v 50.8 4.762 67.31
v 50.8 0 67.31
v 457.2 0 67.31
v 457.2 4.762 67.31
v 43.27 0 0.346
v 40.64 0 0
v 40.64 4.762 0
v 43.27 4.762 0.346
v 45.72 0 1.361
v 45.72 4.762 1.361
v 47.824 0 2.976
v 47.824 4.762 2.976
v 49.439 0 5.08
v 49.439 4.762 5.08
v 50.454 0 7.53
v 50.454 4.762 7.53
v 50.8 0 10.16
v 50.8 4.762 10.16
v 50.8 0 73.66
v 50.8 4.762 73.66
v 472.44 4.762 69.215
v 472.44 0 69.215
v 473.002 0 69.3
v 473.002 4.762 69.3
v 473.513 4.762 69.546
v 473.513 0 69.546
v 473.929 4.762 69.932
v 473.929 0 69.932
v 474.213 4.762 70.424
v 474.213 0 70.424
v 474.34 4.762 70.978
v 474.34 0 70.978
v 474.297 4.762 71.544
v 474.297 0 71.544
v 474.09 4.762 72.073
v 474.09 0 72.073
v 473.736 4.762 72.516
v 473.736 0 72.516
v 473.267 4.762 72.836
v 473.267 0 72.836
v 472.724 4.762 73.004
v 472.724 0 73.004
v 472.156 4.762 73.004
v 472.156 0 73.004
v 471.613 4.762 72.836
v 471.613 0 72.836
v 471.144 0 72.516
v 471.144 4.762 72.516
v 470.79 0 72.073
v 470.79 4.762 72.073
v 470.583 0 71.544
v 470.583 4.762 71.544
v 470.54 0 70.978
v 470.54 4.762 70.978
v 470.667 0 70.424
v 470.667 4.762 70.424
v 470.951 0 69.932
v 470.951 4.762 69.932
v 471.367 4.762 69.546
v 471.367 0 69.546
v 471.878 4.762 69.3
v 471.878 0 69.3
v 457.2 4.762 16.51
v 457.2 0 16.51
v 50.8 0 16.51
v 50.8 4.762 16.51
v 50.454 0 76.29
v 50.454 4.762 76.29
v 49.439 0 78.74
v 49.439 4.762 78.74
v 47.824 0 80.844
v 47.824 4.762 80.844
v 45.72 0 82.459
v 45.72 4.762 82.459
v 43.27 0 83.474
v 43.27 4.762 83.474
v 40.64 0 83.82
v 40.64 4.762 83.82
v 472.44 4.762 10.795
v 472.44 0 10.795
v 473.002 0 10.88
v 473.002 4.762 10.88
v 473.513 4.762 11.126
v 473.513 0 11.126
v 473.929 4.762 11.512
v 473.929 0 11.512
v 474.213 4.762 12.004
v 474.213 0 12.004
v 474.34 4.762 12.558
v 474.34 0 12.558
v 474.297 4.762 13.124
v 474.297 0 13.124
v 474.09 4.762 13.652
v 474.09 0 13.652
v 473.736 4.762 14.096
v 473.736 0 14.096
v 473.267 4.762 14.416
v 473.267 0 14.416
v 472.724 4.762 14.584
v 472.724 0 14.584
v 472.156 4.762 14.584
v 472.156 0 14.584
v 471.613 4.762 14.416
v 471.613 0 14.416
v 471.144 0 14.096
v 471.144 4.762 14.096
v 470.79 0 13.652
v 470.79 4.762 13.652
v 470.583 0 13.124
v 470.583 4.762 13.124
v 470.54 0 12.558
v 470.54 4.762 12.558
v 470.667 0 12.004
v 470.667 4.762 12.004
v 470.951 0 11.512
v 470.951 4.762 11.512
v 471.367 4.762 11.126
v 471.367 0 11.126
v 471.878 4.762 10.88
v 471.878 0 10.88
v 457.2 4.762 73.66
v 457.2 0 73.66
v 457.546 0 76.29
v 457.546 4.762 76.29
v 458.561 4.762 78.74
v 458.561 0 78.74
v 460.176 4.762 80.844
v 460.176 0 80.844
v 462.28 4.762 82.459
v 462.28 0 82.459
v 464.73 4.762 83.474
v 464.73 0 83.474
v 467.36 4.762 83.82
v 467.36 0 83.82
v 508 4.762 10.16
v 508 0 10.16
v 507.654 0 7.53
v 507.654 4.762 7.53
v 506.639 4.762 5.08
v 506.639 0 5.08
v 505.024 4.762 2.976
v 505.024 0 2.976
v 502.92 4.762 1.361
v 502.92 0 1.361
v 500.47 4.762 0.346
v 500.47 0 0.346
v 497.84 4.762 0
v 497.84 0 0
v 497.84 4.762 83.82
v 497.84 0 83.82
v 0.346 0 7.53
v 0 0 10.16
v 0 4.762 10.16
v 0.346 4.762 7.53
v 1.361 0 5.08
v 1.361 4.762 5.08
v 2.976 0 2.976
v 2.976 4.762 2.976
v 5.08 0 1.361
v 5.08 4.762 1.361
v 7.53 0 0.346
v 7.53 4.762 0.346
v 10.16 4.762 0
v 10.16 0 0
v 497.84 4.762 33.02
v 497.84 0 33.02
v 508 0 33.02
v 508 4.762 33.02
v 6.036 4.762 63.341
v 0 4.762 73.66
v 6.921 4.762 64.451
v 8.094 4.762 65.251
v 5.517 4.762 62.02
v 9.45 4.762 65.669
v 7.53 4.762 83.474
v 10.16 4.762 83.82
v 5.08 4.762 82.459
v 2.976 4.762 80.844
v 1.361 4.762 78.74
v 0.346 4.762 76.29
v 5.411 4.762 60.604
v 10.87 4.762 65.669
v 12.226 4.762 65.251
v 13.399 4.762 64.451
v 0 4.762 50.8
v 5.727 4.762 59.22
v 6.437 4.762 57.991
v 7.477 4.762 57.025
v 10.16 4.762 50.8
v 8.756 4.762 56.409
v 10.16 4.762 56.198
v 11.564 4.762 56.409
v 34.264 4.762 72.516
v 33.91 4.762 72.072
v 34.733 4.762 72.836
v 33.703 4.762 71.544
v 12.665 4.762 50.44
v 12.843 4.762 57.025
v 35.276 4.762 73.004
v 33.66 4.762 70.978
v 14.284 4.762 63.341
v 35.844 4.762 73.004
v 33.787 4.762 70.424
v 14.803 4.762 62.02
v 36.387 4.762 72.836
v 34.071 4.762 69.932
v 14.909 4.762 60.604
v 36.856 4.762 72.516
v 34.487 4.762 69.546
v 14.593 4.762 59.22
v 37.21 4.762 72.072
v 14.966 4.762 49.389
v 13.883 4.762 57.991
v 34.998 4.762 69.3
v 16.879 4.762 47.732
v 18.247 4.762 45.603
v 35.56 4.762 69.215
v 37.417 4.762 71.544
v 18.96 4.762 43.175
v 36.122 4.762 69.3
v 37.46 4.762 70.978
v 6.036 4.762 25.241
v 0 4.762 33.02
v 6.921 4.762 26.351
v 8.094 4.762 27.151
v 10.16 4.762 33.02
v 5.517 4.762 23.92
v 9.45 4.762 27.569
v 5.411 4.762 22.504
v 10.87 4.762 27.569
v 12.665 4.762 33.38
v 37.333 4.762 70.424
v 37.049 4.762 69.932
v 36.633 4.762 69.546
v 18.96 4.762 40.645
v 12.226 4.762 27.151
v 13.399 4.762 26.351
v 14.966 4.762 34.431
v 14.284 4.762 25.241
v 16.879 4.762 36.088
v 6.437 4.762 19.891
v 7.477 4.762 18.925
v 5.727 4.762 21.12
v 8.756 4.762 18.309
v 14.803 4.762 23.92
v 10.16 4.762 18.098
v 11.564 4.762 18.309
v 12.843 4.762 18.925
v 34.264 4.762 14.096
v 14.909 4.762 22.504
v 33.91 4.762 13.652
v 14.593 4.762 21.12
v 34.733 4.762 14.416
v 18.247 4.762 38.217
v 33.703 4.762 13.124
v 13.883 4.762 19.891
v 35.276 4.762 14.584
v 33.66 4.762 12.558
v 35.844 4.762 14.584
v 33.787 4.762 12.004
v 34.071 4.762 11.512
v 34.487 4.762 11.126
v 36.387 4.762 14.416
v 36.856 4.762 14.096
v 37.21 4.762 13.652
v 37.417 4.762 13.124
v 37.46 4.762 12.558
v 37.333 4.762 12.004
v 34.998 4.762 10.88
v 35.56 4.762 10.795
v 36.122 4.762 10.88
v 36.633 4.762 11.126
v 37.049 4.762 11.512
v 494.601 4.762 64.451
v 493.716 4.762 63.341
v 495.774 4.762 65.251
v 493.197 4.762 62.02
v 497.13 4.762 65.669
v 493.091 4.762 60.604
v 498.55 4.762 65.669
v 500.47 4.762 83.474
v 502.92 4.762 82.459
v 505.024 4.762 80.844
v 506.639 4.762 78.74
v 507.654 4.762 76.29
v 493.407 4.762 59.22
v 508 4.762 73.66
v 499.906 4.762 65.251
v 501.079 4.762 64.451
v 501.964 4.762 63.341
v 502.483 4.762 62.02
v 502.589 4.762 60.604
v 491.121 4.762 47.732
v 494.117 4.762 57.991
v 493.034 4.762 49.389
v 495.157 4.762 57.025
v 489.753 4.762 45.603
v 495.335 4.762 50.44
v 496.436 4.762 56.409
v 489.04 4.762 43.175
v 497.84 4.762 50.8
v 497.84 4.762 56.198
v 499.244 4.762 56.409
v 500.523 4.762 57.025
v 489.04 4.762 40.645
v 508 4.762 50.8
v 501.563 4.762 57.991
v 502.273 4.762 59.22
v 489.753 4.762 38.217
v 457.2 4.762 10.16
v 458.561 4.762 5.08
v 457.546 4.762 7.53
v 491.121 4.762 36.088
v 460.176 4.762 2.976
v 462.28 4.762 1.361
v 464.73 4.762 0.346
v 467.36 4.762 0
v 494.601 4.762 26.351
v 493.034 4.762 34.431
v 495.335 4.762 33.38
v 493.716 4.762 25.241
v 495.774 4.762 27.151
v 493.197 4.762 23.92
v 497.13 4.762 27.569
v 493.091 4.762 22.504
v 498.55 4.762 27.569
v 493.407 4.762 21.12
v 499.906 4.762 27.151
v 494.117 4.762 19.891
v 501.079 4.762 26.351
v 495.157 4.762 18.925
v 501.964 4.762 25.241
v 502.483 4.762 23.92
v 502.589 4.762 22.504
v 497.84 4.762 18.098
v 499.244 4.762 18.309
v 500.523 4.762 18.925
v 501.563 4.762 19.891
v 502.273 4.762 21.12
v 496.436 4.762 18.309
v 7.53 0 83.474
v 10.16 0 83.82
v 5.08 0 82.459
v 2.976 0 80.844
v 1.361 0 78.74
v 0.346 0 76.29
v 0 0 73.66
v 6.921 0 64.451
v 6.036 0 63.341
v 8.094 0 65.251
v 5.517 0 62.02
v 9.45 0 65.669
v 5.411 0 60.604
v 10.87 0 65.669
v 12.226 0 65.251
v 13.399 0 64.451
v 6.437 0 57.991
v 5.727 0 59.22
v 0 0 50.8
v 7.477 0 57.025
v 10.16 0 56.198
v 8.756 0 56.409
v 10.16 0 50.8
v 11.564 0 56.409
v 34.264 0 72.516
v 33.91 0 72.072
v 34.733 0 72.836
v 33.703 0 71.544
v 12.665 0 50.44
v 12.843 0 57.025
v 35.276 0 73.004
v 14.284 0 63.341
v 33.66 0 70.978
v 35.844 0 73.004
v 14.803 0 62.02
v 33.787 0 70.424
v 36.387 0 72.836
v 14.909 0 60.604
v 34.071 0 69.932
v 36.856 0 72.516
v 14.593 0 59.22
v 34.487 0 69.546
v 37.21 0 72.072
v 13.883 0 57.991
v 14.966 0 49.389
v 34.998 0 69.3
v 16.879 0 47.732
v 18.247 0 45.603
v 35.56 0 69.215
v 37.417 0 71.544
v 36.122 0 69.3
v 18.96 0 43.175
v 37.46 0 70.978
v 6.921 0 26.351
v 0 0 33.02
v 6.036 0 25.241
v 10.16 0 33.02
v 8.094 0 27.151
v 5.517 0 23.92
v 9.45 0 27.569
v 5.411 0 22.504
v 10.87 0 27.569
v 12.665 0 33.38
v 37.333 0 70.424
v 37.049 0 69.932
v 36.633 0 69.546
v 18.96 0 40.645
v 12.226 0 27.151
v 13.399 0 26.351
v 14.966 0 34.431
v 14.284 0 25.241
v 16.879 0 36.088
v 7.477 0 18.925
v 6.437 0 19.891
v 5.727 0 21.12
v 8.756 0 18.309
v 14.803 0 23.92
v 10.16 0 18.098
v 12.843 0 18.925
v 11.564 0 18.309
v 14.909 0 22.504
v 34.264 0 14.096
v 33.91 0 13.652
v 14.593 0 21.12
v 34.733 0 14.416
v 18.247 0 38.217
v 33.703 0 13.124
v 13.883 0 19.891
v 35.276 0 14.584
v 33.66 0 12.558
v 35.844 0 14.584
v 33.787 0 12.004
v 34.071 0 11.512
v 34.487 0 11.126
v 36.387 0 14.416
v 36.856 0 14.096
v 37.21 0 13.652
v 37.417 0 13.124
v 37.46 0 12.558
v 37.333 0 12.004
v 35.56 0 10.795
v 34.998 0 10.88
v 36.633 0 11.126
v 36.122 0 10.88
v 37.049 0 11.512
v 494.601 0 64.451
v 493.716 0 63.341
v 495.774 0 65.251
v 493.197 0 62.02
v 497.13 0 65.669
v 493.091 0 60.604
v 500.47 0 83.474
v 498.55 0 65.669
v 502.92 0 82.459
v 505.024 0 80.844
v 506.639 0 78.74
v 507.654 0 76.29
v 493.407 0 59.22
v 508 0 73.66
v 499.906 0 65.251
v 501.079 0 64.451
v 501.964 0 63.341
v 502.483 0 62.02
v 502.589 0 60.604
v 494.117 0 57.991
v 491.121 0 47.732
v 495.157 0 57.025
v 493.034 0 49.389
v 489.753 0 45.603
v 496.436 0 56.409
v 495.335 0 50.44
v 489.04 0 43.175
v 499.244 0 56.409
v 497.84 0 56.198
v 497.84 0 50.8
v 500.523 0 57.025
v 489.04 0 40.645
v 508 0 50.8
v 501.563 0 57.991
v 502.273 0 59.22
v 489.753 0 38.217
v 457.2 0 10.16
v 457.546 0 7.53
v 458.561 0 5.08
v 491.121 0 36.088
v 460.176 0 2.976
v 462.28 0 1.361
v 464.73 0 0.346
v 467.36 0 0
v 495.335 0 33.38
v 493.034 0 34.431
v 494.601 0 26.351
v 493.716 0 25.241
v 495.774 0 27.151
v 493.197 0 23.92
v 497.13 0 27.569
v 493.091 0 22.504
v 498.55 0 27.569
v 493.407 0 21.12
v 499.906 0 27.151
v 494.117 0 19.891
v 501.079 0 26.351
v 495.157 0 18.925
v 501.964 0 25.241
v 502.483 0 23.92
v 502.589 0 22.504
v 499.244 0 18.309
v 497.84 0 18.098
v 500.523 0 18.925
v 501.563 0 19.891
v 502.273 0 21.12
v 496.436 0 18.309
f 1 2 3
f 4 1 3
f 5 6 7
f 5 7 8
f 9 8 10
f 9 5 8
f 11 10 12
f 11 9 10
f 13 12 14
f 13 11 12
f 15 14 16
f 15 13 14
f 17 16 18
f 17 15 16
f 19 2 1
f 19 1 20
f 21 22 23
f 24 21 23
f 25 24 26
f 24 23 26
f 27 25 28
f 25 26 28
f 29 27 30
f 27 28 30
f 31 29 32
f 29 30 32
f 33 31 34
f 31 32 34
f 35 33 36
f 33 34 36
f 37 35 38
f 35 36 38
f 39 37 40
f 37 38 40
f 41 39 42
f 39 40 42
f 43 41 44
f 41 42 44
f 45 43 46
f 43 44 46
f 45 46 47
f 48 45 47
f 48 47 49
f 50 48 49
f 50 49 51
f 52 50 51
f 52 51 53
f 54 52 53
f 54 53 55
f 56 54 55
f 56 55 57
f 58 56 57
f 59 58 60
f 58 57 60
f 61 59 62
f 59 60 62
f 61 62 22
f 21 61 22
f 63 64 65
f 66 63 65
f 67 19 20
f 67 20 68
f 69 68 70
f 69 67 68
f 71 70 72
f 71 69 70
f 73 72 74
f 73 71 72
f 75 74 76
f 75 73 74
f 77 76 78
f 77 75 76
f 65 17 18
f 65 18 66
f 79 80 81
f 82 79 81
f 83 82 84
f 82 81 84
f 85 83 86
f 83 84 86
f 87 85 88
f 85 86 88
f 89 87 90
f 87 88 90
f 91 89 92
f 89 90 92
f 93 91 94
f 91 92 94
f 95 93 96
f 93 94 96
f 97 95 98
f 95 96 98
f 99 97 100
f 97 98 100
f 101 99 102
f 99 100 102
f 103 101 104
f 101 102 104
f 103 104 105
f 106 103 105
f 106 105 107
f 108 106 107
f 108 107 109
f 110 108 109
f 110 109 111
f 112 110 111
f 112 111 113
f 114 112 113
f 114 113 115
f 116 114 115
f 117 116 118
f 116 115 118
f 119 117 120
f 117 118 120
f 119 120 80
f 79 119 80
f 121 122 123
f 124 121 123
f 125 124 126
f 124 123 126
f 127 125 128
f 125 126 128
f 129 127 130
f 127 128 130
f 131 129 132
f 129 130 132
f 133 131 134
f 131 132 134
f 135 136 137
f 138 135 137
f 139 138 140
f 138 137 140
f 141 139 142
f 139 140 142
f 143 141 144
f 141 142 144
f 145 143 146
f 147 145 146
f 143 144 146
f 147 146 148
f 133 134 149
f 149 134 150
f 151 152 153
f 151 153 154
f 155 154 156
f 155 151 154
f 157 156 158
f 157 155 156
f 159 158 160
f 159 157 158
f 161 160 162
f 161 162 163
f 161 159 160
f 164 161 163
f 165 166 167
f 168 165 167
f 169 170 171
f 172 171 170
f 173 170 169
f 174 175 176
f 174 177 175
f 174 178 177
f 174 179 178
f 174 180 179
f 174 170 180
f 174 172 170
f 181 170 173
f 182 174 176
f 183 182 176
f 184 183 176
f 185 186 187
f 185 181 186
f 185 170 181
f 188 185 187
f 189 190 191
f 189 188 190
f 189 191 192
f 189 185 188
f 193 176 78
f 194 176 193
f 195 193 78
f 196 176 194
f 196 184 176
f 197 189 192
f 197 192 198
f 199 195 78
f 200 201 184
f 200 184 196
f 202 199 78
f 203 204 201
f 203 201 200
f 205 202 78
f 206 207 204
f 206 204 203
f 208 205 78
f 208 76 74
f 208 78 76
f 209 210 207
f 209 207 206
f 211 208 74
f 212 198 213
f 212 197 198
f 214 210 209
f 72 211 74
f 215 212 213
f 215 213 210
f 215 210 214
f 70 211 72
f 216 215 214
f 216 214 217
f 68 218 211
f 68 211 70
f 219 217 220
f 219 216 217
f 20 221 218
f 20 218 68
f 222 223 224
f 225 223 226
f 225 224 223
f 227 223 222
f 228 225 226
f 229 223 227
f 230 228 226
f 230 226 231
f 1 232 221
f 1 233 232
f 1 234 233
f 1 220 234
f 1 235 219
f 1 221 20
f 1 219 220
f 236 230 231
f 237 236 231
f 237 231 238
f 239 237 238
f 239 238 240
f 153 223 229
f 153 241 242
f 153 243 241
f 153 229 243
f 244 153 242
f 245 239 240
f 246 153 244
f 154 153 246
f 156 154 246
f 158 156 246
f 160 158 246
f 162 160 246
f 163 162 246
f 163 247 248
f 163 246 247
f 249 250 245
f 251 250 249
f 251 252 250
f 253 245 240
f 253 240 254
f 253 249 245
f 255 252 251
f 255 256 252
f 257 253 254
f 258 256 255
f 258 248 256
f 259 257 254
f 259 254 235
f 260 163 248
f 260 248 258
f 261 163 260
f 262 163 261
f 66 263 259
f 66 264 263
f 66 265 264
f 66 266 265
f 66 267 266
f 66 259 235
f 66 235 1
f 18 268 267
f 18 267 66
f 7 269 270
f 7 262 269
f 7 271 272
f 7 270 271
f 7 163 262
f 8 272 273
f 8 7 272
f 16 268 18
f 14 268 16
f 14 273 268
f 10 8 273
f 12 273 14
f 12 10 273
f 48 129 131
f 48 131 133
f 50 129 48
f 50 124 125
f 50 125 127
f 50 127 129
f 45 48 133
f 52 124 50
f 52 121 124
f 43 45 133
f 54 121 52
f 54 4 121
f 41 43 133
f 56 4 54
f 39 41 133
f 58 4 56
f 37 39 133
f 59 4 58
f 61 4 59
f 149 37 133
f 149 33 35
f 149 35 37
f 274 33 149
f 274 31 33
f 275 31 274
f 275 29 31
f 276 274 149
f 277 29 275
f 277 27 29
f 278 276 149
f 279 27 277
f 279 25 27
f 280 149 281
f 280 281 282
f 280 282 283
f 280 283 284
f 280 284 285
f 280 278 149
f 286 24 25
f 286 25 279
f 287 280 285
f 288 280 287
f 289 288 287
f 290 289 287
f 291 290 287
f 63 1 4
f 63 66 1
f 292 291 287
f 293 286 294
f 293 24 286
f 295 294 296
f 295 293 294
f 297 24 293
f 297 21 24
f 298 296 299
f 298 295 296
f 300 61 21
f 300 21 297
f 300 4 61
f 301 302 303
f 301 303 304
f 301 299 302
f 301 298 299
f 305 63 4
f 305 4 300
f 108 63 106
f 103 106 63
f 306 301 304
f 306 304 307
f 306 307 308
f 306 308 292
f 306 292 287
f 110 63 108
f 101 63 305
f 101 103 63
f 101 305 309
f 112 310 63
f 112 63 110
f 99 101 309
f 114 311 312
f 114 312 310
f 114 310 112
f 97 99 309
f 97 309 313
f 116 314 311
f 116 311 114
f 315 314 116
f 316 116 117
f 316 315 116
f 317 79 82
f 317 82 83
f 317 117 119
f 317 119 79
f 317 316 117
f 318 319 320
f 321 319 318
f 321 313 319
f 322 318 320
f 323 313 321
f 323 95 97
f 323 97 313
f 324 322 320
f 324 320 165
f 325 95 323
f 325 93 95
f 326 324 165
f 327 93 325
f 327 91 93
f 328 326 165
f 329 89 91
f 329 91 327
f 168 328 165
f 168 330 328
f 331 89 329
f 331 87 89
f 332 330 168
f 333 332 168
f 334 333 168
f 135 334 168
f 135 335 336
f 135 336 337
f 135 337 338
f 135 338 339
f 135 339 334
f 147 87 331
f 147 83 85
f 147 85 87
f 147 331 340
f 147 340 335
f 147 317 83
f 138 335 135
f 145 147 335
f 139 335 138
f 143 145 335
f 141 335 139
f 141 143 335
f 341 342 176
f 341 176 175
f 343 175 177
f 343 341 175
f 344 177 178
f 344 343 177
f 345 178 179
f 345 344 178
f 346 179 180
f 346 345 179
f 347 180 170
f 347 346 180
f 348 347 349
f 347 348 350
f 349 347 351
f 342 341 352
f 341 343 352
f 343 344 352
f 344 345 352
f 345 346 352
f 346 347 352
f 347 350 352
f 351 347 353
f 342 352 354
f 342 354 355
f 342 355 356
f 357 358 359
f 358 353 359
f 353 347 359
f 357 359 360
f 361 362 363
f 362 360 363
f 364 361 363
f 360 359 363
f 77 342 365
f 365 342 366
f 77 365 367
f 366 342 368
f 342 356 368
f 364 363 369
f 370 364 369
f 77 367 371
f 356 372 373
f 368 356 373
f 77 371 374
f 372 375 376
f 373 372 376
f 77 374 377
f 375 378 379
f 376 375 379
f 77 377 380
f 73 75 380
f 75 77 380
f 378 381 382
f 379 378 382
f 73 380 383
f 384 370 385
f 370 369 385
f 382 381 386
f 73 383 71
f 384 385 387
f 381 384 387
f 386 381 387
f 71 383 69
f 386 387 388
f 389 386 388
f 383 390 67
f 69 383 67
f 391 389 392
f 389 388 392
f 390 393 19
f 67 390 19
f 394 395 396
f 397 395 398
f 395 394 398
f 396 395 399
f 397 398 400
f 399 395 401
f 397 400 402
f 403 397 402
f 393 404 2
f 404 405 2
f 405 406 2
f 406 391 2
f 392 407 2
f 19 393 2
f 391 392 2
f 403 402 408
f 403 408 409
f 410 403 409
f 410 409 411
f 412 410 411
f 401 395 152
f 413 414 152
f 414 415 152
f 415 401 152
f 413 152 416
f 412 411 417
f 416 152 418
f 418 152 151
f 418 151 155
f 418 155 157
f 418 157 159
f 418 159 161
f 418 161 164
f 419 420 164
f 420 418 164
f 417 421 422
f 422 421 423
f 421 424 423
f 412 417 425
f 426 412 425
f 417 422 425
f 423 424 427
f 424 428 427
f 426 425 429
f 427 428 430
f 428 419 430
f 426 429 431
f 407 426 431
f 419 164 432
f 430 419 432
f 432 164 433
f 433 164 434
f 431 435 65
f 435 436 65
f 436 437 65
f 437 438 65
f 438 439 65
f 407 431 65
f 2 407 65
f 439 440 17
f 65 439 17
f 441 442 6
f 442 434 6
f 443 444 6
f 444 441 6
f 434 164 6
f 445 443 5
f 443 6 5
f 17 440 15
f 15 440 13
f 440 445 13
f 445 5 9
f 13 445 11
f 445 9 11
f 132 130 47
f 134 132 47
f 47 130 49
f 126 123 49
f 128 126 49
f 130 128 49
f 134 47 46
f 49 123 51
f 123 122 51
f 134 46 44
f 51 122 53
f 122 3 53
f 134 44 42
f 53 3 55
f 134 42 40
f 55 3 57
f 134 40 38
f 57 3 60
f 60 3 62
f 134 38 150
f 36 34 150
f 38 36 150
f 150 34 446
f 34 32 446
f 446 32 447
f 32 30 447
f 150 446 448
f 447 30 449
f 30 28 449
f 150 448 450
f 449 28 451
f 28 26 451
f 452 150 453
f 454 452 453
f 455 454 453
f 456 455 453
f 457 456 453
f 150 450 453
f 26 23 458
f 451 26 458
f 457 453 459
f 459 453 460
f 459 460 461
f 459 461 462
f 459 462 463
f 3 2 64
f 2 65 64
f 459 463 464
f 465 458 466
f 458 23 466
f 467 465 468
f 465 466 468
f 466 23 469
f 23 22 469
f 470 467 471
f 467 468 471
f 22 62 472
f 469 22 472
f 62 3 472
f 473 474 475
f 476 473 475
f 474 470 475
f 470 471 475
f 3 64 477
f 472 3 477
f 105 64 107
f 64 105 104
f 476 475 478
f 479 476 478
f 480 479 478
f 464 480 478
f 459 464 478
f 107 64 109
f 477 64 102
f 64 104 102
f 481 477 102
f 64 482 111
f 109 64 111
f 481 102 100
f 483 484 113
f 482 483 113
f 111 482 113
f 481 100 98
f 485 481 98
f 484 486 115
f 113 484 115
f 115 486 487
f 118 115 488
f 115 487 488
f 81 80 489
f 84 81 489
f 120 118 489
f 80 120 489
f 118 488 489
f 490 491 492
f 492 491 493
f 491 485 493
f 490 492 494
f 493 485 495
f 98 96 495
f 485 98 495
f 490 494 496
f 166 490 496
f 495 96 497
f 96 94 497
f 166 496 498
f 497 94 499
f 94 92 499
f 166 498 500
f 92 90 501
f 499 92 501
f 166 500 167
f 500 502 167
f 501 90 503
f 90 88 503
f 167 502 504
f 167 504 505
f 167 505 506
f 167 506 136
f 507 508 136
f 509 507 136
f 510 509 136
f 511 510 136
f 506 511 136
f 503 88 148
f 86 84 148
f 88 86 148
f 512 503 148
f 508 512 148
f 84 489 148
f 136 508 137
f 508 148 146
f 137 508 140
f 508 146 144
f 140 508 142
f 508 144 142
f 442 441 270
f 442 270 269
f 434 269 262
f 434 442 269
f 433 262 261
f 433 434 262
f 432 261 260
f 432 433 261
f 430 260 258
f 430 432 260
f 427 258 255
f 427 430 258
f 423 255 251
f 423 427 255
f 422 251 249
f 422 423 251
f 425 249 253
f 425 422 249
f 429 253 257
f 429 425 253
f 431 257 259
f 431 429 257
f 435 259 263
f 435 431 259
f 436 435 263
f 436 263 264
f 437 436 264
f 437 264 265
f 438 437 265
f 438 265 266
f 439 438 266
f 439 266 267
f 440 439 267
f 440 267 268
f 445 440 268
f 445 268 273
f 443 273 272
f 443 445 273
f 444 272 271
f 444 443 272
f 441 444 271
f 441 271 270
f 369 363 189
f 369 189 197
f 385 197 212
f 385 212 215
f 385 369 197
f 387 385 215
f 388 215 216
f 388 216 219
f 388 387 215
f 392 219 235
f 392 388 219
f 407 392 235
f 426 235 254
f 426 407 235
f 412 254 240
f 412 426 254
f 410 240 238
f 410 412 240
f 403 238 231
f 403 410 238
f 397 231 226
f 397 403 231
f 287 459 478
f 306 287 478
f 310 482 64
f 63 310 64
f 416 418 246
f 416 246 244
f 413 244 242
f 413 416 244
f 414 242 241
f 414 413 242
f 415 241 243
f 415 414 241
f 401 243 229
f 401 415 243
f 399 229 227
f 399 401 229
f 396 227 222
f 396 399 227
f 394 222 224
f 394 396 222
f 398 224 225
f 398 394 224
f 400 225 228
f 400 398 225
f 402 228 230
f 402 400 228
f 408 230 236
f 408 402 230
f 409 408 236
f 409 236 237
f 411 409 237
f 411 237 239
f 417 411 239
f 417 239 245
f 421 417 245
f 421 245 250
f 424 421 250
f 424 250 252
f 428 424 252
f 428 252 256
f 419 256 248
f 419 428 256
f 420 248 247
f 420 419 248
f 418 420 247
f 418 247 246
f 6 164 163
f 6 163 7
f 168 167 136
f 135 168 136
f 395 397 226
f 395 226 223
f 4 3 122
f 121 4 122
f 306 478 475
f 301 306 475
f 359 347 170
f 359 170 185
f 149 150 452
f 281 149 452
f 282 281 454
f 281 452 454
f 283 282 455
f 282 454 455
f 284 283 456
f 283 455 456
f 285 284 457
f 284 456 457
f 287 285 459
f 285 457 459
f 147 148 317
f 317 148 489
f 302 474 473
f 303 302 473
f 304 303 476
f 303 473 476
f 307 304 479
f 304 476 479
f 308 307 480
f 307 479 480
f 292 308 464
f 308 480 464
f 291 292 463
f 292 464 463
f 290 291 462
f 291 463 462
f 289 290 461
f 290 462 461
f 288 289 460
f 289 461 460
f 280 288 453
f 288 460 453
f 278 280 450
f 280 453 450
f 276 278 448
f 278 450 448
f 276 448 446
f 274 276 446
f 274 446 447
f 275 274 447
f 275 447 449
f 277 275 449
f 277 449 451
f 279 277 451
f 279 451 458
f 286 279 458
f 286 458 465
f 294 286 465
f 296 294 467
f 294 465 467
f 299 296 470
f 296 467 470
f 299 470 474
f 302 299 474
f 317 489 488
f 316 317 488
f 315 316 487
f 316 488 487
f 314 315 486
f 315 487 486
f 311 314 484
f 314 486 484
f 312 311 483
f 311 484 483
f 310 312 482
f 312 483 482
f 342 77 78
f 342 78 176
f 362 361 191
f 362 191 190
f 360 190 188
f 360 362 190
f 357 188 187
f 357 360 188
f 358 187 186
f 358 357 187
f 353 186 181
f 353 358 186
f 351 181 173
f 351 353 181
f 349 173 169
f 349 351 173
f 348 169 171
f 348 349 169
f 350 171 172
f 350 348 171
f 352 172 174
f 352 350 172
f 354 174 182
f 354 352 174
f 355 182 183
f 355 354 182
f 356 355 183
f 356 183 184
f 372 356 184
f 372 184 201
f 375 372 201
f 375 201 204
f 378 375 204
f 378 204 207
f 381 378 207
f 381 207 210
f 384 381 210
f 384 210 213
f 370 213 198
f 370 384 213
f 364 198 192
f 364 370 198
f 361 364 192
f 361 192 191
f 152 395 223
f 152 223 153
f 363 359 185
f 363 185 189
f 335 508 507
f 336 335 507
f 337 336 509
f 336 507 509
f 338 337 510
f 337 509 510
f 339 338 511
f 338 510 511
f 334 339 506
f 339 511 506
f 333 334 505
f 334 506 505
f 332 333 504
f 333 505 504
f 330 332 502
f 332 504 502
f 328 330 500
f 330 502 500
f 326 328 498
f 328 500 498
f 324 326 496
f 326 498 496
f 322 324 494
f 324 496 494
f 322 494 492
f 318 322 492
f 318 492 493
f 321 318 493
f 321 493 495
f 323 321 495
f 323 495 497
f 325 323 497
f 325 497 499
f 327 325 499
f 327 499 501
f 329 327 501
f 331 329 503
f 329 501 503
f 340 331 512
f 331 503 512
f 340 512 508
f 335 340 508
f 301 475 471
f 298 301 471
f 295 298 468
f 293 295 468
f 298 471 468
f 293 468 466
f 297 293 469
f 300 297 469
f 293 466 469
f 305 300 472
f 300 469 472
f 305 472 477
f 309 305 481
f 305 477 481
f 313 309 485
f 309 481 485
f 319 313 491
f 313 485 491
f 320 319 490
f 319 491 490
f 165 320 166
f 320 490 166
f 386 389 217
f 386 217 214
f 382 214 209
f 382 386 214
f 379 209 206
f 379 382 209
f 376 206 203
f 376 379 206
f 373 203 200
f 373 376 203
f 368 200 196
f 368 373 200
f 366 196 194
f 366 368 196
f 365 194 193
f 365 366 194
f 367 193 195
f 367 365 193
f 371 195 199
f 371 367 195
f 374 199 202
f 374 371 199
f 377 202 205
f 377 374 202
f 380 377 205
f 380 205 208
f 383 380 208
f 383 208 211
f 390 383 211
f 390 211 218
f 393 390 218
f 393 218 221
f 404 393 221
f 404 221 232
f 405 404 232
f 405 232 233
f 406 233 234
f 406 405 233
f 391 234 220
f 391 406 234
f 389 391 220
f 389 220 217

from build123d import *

# Parameters (mm, degrees)
SKETCH1_R           = 4.7625
SKETCH1_R_2         = 1.905
BOSS_EXTRUDE1_DEPTH = 4.7625


with BuildPart() as part:
    # Sketch1 → Boss-Extrude1 (new body)
    with BuildSketch(Plane(origin=(0, 0, 0), x_dir=(1, 0, 0), z_dir=(0, 1, 0))):
        with BuildLine():
            Line((10.16, 0), (40.64, 0))
            ThreePointArc((40.64, 0), (47.824204897, -2.975795103), (50.8, -10.16))
            Line((50.8, -10.16), (50.8, -16.51))
            Line((50.8, -16.51), (254, -16.51))
            Line((254, -16.51), (254, -67.31))
            Line((254, -67.31), (50.8, -67.31))
            Line((50.8, -67.31), (50.8, -73.66))
            ThreePointArc((50.8, -73.66), (47.824204897, -80.844204897), (40.64, -83.82))
            Line((40.64, -83.82), (10.16, -83.82))
            ThreePointArc((10.16, -83.82), (2.975795103, -80.844204897), (0, -73.66))
            Line((0, -73.66), (0, -50.8))
            Line((0, -50.8), (10.16, -50.8))
            ThreePointArc((10.16, -50.8), (19.05, -41.91), (10.16, -33.02))
            Line((10.16, -33.02), (0, -33.02))
            Line((0, -33.02), (0, -10.16))
            ThreePointArc((0, -10.16), (2.975795103, -2.975795103), (10.16, 0))
        make_face()
        with Locations(Location((10.16, -60.96, 0), (0, 0, 90))):
            Circle(SKETCH1_R, mode=Mode.SUBTRACT)
        with Locations(Location((10.16, -22.86, 0), (0, 0, 90))):
            Circle(SKETCH1_R, mode=Mode.SUBTRACT)
        with Locations(Location((35.56, -71.12, 0), (0, 0, 90))):
            Circle(SKETCH1_R_2, mode=Mode.SUBTRACT)
        with Locations(Location((35.56, -12.7, 0), (0, 0, 90))):
            Circle(SKETCH1_R_2, mode=Mode.SUBTRACT)
    boss_extrude1 = extrude(amount=BOSS_EXTRUDE1_DEPTH)

    # Mirror1: Boss-Extrude1 across plane
    add(boss_extrude1.mirror(Plane(origin=(254, 4.7625, 67.31), x_dir=(0, 0, 1), z_dir=(-1, 0, 0))))


solid = part.part
